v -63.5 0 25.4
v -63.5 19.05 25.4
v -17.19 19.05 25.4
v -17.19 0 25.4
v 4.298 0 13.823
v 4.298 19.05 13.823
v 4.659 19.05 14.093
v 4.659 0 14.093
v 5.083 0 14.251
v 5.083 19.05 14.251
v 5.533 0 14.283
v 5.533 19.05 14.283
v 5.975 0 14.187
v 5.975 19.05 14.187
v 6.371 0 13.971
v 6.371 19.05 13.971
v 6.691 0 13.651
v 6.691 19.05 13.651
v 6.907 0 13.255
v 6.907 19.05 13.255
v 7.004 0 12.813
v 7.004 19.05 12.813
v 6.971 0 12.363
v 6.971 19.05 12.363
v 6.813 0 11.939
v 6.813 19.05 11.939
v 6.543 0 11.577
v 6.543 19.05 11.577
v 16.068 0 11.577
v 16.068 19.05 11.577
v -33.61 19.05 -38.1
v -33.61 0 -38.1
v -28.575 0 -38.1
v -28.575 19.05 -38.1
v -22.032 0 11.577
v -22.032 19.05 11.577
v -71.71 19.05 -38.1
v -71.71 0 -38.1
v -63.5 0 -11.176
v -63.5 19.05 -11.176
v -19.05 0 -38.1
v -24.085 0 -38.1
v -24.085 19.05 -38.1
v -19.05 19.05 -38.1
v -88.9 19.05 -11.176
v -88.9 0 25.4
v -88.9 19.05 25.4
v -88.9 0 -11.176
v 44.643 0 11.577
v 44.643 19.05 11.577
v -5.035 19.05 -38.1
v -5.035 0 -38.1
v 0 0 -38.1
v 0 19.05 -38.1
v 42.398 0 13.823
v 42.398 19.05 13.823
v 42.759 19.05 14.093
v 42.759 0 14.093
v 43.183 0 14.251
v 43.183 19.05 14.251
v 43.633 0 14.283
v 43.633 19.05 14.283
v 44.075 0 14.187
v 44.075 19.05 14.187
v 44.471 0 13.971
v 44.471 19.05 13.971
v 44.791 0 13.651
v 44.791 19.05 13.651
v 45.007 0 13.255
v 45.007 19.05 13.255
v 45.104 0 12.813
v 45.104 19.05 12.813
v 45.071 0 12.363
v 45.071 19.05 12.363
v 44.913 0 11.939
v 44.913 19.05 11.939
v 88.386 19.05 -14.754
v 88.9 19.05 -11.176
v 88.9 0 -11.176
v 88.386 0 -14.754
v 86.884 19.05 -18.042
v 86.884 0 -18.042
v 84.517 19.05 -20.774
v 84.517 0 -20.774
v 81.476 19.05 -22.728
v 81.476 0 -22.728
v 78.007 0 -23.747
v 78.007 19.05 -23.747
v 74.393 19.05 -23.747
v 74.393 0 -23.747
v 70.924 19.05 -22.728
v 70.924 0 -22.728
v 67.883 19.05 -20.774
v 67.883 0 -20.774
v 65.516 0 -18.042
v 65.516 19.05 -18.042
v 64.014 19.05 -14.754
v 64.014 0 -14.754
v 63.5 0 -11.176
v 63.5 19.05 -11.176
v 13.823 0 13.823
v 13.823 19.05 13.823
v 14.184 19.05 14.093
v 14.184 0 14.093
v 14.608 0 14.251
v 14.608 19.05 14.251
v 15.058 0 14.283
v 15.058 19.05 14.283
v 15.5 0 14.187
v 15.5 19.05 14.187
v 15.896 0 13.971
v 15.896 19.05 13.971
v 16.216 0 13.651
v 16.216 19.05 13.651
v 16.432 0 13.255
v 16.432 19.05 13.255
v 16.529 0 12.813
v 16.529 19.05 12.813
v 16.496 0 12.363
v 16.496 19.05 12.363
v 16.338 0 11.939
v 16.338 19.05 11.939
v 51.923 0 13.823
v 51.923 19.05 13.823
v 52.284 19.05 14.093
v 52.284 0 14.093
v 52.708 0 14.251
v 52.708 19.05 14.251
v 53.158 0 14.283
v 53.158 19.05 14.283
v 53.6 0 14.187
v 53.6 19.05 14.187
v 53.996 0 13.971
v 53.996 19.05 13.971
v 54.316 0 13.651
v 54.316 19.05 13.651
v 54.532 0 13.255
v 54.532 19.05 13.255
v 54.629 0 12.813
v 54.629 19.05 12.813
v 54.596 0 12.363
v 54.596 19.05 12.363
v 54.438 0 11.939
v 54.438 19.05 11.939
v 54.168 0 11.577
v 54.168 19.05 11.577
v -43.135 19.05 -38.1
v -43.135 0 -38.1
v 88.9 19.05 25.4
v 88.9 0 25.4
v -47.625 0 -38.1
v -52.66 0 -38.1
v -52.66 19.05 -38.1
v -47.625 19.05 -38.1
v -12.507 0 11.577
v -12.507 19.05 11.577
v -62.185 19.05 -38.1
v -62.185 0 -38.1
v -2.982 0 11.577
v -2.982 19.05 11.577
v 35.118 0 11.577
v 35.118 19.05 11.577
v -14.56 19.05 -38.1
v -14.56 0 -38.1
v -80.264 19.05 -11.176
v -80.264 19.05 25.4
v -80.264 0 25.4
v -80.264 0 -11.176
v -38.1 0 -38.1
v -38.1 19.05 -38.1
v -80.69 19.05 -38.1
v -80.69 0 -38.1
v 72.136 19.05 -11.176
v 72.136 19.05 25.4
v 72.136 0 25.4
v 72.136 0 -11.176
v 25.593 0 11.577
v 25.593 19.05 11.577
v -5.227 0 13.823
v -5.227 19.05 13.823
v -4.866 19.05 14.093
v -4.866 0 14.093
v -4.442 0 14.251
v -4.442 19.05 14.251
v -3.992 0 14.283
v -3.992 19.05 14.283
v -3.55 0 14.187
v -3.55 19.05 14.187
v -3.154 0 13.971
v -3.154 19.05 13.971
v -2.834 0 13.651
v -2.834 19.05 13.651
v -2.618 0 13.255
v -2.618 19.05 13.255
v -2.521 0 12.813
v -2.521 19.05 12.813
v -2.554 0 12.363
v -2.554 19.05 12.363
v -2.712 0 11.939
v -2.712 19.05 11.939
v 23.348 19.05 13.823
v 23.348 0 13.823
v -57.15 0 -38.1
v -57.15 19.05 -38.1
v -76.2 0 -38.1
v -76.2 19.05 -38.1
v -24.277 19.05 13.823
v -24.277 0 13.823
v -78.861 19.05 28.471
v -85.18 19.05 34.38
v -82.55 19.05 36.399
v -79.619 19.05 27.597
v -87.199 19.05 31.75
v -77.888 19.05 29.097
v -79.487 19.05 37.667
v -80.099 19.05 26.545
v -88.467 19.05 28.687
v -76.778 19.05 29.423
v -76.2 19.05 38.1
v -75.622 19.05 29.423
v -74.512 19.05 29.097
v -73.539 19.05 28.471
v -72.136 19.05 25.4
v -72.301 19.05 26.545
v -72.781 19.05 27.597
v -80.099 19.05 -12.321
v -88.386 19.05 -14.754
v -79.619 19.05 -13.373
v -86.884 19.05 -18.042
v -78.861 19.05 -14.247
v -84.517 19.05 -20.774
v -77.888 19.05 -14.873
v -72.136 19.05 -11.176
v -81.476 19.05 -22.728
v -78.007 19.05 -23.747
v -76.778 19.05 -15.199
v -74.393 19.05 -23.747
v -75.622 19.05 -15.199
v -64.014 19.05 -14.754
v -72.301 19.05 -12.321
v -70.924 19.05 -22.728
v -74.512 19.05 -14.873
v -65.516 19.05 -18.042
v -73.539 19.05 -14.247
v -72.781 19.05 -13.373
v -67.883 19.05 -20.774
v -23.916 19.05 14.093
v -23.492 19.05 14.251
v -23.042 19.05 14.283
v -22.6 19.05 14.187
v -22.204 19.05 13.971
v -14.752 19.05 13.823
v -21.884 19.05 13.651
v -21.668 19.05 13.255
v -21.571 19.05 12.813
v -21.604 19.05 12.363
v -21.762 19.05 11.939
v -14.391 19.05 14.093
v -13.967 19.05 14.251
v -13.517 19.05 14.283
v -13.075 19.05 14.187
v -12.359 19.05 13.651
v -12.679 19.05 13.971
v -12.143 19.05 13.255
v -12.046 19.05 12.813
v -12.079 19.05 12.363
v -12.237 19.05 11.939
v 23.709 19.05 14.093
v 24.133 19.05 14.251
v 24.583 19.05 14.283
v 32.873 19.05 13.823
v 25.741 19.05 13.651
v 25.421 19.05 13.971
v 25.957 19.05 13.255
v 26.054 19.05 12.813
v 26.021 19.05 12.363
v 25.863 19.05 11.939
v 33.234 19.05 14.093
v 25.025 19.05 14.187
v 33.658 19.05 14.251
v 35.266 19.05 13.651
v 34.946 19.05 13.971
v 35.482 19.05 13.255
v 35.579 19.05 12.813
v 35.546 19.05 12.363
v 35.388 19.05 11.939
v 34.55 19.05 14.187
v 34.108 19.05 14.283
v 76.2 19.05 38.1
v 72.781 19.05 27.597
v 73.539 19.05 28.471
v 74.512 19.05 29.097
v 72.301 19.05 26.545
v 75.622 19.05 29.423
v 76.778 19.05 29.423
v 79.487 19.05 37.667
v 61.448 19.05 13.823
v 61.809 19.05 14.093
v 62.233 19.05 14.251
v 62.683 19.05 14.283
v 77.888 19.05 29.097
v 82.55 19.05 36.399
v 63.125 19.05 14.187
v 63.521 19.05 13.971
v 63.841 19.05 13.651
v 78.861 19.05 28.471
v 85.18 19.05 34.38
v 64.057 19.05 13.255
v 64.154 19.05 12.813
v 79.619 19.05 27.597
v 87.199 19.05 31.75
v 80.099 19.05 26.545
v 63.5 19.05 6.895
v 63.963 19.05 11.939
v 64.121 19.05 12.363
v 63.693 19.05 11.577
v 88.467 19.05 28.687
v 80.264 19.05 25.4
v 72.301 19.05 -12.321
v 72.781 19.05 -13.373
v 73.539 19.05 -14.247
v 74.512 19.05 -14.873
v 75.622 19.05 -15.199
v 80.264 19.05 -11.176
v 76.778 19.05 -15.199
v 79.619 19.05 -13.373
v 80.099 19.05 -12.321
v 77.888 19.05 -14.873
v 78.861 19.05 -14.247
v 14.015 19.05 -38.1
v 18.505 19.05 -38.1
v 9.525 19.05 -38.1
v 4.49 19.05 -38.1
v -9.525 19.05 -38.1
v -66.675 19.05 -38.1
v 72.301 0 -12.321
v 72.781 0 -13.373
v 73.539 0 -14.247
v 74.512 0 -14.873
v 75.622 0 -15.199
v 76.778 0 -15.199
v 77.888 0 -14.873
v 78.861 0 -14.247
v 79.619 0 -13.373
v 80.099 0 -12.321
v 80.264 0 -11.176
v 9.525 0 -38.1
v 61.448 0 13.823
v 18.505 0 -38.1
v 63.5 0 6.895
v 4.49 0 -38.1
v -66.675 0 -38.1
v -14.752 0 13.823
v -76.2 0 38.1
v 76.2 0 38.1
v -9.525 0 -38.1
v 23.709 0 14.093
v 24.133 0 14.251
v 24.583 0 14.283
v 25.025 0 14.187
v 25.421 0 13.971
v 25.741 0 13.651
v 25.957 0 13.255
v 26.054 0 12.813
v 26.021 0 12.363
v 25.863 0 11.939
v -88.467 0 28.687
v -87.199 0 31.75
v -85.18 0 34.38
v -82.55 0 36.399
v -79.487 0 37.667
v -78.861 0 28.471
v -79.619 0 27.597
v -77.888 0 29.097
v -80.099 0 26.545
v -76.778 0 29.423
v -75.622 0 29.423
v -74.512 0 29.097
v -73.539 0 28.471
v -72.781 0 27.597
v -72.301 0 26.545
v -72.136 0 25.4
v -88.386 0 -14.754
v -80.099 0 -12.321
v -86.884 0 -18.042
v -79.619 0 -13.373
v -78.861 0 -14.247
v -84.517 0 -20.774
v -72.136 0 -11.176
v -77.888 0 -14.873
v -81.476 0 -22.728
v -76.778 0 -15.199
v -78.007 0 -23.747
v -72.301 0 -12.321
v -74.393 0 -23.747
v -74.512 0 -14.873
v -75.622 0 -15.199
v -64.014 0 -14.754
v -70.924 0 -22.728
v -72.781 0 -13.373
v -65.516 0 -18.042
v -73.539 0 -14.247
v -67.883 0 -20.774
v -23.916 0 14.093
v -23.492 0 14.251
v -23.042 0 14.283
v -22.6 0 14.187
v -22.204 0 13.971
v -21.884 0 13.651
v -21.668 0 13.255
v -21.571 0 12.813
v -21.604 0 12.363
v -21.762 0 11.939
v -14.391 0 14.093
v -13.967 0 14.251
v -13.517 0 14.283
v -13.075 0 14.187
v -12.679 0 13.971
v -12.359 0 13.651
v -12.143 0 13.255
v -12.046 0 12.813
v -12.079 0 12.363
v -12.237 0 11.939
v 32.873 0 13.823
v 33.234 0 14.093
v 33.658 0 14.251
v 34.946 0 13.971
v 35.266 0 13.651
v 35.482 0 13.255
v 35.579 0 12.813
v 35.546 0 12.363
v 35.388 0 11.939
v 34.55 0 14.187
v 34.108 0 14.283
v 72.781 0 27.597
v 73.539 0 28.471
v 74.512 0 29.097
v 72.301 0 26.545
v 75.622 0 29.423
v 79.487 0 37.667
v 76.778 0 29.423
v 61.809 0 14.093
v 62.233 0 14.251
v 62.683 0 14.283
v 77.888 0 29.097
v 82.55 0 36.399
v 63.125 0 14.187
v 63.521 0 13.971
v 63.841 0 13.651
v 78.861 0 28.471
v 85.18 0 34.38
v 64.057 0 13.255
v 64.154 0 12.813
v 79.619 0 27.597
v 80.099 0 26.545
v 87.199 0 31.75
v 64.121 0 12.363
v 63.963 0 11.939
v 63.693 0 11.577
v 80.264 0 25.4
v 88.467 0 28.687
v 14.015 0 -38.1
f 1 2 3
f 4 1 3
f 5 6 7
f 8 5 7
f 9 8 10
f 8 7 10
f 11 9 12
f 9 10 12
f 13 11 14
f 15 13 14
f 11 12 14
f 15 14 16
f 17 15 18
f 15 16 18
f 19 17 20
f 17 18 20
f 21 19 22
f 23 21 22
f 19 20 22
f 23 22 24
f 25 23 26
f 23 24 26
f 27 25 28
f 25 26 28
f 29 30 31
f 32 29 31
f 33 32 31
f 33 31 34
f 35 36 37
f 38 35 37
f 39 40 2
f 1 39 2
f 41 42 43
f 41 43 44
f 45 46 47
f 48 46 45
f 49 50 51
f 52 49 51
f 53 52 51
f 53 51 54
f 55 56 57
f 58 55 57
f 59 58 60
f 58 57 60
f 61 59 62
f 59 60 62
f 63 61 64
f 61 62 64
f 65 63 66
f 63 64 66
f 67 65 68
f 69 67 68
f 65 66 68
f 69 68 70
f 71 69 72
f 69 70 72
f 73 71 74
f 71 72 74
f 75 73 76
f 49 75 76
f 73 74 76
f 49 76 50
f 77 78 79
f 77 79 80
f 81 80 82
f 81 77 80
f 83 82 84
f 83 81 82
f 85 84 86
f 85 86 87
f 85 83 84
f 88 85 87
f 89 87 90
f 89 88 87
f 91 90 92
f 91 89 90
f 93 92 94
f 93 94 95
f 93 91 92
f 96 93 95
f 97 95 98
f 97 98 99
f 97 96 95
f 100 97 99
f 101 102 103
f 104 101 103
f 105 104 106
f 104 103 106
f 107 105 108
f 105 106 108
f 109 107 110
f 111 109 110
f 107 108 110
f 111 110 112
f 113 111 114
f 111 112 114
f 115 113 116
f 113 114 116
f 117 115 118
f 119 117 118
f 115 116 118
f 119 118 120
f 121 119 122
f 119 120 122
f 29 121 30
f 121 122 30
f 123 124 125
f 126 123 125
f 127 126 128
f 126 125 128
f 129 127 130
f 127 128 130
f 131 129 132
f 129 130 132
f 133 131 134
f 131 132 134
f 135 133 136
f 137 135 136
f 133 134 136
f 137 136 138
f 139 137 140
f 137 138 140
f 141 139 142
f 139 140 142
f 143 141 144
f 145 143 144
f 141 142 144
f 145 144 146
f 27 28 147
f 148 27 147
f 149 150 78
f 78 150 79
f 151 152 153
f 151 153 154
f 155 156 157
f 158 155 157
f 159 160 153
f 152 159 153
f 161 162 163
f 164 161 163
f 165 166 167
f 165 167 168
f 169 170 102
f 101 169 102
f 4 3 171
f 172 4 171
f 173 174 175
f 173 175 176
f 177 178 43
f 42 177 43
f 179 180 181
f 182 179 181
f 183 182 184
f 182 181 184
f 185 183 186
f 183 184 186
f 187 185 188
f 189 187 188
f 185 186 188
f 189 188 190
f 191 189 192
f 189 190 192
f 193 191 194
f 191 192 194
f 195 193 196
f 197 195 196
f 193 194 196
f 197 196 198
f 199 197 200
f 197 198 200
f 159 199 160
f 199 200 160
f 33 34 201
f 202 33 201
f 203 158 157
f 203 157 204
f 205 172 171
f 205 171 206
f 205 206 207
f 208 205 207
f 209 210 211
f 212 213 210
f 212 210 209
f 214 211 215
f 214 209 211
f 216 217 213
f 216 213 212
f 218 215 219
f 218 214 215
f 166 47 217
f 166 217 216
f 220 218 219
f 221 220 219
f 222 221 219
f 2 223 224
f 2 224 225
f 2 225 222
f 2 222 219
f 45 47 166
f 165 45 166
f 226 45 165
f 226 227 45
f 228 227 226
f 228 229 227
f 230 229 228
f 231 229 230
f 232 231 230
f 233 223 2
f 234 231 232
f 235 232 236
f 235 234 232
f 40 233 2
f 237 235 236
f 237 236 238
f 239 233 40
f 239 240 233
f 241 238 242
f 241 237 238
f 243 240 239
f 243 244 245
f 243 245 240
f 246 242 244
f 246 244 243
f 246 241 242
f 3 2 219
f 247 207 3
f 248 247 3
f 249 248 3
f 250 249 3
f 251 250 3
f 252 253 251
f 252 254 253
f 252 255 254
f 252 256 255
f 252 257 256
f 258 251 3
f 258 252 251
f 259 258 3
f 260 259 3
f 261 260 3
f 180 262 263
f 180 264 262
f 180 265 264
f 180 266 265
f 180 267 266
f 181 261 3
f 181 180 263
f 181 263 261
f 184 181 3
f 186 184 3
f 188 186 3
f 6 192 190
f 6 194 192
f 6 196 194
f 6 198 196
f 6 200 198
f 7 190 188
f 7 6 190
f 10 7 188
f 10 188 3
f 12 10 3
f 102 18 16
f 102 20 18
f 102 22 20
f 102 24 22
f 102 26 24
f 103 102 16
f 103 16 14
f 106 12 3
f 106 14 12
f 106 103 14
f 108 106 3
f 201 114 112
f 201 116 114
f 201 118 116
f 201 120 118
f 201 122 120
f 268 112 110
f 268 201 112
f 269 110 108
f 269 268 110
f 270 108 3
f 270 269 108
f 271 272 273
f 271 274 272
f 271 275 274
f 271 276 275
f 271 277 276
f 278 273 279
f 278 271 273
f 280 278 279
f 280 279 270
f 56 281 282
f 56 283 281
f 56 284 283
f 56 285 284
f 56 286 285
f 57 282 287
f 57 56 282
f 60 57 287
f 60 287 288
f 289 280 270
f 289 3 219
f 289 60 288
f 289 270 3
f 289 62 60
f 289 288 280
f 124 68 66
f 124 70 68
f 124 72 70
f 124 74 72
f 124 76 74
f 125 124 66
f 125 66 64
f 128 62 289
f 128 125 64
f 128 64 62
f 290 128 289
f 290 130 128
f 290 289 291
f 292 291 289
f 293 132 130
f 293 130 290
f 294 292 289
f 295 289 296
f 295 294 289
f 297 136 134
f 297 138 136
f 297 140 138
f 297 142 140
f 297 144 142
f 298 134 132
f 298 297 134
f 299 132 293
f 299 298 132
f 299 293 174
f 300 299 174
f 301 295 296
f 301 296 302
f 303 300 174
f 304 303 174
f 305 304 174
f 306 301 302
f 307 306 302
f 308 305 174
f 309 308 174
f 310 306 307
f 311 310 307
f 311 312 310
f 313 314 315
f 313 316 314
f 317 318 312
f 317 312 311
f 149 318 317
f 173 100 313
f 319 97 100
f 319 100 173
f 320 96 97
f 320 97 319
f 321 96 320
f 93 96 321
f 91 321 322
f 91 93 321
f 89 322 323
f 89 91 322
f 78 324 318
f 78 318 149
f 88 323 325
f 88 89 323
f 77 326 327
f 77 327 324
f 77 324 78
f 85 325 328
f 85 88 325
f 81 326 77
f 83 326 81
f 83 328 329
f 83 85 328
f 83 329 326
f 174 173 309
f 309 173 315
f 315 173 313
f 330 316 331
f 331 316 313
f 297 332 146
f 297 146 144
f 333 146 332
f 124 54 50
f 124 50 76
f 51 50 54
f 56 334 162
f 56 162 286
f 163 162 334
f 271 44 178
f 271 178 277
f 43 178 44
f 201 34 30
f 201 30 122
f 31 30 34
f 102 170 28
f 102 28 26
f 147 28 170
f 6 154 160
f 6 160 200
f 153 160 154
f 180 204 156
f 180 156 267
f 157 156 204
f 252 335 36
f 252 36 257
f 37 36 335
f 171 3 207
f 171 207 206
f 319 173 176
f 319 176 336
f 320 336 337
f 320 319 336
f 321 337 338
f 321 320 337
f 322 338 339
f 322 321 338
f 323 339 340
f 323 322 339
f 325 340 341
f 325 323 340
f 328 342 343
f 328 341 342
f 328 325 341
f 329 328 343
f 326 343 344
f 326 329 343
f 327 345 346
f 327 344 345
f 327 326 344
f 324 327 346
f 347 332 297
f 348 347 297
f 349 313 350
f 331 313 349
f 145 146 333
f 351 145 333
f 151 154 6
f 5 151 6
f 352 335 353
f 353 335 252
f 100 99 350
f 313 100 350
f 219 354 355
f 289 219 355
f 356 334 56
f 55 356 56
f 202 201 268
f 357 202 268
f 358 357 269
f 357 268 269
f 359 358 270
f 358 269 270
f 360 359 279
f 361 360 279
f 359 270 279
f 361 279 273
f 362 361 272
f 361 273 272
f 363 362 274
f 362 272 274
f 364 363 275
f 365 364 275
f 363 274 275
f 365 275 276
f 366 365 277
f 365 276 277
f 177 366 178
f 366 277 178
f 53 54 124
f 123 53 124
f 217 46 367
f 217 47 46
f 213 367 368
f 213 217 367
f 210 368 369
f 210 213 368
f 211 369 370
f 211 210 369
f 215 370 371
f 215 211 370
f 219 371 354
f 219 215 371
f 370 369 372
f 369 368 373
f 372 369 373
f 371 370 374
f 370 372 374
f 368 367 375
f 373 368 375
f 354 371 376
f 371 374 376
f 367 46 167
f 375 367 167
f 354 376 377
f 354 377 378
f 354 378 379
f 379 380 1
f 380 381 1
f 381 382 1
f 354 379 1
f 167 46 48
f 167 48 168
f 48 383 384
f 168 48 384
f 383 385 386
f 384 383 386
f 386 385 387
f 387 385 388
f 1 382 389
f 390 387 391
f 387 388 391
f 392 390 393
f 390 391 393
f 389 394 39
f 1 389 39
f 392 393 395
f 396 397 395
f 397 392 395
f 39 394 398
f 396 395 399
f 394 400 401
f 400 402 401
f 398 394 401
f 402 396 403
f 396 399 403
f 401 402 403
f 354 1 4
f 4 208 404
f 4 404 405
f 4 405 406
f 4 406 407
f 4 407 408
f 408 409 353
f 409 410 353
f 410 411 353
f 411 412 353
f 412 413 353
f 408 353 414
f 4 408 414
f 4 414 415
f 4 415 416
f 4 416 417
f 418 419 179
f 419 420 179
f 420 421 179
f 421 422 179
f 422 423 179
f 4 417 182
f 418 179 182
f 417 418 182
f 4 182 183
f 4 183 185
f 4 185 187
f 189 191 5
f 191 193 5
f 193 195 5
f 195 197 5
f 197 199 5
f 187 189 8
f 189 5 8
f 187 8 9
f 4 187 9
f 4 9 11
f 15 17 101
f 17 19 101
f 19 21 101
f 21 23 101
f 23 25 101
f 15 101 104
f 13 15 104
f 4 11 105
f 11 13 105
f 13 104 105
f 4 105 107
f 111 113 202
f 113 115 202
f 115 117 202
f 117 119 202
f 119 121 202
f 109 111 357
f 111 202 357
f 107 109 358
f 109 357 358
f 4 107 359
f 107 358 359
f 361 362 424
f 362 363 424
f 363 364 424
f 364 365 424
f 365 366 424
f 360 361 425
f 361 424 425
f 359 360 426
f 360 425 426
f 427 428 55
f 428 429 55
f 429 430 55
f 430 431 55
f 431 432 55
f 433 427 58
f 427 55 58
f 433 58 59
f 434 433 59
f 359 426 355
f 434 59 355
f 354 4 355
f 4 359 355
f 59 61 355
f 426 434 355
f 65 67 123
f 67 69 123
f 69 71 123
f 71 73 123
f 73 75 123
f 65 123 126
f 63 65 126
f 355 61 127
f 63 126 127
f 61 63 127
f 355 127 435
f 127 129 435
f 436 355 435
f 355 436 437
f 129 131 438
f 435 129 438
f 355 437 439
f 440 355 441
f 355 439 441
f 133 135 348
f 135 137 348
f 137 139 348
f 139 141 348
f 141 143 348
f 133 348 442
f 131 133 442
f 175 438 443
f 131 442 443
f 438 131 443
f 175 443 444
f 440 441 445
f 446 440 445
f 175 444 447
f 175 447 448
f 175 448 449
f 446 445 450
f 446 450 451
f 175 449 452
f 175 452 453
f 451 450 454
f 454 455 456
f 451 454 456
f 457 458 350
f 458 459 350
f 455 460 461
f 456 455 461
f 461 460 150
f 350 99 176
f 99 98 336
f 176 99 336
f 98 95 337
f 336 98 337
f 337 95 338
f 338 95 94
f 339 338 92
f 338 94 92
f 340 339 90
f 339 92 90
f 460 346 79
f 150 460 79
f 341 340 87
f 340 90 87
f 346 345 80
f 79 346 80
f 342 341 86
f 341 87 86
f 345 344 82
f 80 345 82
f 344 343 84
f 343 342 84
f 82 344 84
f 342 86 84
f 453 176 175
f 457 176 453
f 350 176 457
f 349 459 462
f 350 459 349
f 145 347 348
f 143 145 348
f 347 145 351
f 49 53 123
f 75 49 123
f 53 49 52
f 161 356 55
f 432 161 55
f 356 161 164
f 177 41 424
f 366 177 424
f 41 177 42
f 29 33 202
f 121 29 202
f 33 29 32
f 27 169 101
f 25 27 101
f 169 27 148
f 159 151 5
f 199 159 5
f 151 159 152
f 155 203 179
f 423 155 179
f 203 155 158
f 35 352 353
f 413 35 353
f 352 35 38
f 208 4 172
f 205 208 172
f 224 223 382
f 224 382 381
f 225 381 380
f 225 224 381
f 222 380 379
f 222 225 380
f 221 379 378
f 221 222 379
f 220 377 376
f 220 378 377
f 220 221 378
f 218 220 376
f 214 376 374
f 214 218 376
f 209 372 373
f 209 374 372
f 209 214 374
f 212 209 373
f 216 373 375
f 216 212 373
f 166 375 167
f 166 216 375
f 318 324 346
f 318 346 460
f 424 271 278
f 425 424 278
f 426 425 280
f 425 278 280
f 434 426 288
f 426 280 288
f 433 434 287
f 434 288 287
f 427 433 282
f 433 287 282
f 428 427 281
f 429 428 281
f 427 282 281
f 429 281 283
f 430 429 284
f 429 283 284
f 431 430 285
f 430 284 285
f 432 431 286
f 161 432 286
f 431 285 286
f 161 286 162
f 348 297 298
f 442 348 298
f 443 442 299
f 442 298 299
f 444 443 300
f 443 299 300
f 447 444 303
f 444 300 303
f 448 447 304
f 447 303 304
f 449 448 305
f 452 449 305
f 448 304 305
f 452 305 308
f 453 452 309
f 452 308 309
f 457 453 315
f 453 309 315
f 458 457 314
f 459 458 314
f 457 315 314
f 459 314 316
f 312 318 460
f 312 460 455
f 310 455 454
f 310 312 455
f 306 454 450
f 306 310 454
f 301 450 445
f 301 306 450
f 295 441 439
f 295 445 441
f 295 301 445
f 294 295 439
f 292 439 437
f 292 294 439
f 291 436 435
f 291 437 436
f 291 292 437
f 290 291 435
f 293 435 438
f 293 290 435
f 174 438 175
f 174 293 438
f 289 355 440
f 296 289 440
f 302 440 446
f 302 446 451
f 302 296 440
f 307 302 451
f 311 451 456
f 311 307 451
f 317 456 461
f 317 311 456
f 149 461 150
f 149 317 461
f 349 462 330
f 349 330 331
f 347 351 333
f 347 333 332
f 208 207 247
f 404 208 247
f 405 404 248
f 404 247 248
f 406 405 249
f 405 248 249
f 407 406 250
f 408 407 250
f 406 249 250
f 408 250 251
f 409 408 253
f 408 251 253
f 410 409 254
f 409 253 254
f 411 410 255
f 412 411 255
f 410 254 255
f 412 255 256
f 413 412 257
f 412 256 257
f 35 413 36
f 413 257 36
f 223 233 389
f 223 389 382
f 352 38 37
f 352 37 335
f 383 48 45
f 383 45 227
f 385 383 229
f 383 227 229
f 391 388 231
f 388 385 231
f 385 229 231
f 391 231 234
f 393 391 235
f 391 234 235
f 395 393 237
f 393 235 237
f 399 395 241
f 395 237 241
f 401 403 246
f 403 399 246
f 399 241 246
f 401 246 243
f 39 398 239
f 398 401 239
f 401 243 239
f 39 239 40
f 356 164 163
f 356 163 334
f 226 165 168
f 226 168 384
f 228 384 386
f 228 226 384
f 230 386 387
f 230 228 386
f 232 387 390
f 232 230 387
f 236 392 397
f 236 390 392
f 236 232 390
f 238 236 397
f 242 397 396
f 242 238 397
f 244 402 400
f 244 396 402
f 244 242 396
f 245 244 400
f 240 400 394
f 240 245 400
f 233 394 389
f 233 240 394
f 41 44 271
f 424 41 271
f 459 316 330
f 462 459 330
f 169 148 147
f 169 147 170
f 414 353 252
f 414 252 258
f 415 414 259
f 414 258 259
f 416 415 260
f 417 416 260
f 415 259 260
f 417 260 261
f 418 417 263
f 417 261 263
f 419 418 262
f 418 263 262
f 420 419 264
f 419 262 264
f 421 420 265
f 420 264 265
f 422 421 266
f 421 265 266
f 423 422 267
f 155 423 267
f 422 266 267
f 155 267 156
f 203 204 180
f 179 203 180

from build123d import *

# Parameters (mm, degrees)
SKETCH1_W           = 177.8
SKETCH1_H           = 76.2
BOSS_EXTRUDE1_DEPTH = 19.05
CUT_EXTRUDE1_DEPTH  = 99.578509321
LPATTERN1_COUNT     = 10
LPATTERN1_PITCH     = 9.525
CUT_EXTRUDE3_DEPTH  = 99.578509321
FILLET1_R           = 12.7
CUT_EXTRUDE4_REACH  = 100.579


with BuildPart() as part:
    # Sketch1 → Boss-Extrude1 (new body)
    with BuildSketch(Plane(origin=(0, 0, 0), x_dir=(1, 0, 0), z_dir=(0, 1, 0))):
        Rectangle(SKETCH1_W, SKETCH1_H)
    extrude(amount=BOSS_EXTRUDE1_DEPTH)

    # Sketch2 → Cut-Extrude1 (cut, through all)
    with BuildSketch(Plane(origin=(0, 19.05, 0), x_dir=(1, 0, 0), z_dir=(0, 1, 0))):
        with BuildLine():
            Line((-76.2, 38.1), (-24.277467985, -13.822532015))
            ThreePointArc((-24.277467985, -13.822532015), (-22.032403955, -13.822532015), (-22.032403955, -11.577467985))
            Line((-22.032403955, -11.577467985), (-71.709871939, 38.1))
            Line((-71.709871939, 38.1), (-76.2, 38.1))
        make_face()
    cut_extrude1 = extrude(amount=-CUT_EXTRUDE1_DEPTH, mode=Mode.SUBTRACT)

    # LPattern1: Cut-Extrude1 ×10
    with Locations(*[(i * LPATTERN1_PITCH, 0, 0) for i in range(1, LPATTERN1_COUNT)]):
        add(cut_extrude1, mode=Mode.SUBTRACT)

    # Sketch3 → Cut-Extrude3 (cut, through all)
    with BuildSketch(Plane(origin=(0, 19.05, 0), x_dir=(1, 0, 0), z_dir=(0, 1, 0))):
        with BuildLine():
            Line((-72.136, 11.176), (-72.136, -25.4))
            ThreePointArc((-72.136, -25.4), (-76.2, -29.464), (-80.264, -25.4))
            Line((-80.264, -25.4), (-80.264, 11.176))
            ThreePointArc((-80.264, 11.176), (-76.2, 15.24), (-72.136, 11.176))
        make_face()
        with BuildLine():
            Line((80.264, 11.176), (80.264, -25.4))
            ThreePointArc((80.264, -25.4), (76.2, -29.464), (72.136, -25.4))
            Line((72.136, -25.4), (72.136, 11.176))
            ThreePointArc((72.136, 11.176), (76.2, 15.24), (80.264, 11.176))
        make_face()
    extrude(amount=-CUT_EXTRUDE3_DEPTH, mode=Mode.SUBTRACT)

    # Fillet1
    fillet1_edges = [part.edges().sort_by_distance(p)[0] for p in [
        (88.9, 9.525, 38.1),
        (-88.9, 9.525, 38.1),
    ]]
    fillet(fillet1_edges, radius=FILLET1_R)

    # Sketch5 → Cut-Extrude4 (cut, up to next)
    with BuildSketch(Plane(origin=(0, 19.05, 0), x_dir=(1, 0, 0), z_dir=(0, 1, 0)), mode=Mode.PRIVATE) as cut_extrude4_sk1:
        with BuildLine():
            Line((-88.9, 38.1), (-88.9, 11.176))
            ThreePointArc((-88.9, 11.176), (-76.2, 23.876), (-63.5, 11.176))
            Line((-63.5, 11.176), (-63.5, -25.4))
            Line((-63.5, -25.4), (-17.190128061, -25.4))
            Line((-17.190128061, -25.4), (-80.690128061, 38.1))
            Line((-80.690128061, 38.1), (-88.9, 38.1))
        make_face()
    cut_extrude4_tool1 = extrude(cut_extrude4_sk1.sketch, amount=-CUT_EXTRUDE4_REACH, mode=Mode.PRIVATE) & part.part
    # Sketch5 → Cut-Extrude4 (cut, up to next)
    with BuildSketch(Plane(origin=(0, 19.05, 0), x_dir=(1, 0, 0), z_dir=(0, 1, 0)), mode=Mode.PRIVATE) as cut_extrude4_sk2:
        with BuildLine():
            Line((88.9, 38.1), (88.9, 11.176))
            ThreePointArc((88.9, 11.176), (76.2, 23.876), (63.5, 11.176))
            Line((63.5, 11.176), (63.5, -6.894743879))
            Line((63.5, -6.894743879), (18.505256121, 38.1))
            Line((18.505256121, 38.1), (88.9, 38.1))
        make_face()
    cut_extrude4_tool2 = extrude(cut_extrude4_sk2.sketch, amount=-CUT_EXTRUDE4_REACH, mode=Mode.PRIVATE) & part.part
    add(cut_extrude4_tool1.solids().sort_by_distance((-54.694692, 19.05, 2.076877))[0], mode=Mode.SUBTRACT)
    add(cut_extrude4_tool2.solids().sort_by_distance((56.766727, 19.05, -24.977603))[0], mode=Mode.SUBTRACT)


solid = part.part
